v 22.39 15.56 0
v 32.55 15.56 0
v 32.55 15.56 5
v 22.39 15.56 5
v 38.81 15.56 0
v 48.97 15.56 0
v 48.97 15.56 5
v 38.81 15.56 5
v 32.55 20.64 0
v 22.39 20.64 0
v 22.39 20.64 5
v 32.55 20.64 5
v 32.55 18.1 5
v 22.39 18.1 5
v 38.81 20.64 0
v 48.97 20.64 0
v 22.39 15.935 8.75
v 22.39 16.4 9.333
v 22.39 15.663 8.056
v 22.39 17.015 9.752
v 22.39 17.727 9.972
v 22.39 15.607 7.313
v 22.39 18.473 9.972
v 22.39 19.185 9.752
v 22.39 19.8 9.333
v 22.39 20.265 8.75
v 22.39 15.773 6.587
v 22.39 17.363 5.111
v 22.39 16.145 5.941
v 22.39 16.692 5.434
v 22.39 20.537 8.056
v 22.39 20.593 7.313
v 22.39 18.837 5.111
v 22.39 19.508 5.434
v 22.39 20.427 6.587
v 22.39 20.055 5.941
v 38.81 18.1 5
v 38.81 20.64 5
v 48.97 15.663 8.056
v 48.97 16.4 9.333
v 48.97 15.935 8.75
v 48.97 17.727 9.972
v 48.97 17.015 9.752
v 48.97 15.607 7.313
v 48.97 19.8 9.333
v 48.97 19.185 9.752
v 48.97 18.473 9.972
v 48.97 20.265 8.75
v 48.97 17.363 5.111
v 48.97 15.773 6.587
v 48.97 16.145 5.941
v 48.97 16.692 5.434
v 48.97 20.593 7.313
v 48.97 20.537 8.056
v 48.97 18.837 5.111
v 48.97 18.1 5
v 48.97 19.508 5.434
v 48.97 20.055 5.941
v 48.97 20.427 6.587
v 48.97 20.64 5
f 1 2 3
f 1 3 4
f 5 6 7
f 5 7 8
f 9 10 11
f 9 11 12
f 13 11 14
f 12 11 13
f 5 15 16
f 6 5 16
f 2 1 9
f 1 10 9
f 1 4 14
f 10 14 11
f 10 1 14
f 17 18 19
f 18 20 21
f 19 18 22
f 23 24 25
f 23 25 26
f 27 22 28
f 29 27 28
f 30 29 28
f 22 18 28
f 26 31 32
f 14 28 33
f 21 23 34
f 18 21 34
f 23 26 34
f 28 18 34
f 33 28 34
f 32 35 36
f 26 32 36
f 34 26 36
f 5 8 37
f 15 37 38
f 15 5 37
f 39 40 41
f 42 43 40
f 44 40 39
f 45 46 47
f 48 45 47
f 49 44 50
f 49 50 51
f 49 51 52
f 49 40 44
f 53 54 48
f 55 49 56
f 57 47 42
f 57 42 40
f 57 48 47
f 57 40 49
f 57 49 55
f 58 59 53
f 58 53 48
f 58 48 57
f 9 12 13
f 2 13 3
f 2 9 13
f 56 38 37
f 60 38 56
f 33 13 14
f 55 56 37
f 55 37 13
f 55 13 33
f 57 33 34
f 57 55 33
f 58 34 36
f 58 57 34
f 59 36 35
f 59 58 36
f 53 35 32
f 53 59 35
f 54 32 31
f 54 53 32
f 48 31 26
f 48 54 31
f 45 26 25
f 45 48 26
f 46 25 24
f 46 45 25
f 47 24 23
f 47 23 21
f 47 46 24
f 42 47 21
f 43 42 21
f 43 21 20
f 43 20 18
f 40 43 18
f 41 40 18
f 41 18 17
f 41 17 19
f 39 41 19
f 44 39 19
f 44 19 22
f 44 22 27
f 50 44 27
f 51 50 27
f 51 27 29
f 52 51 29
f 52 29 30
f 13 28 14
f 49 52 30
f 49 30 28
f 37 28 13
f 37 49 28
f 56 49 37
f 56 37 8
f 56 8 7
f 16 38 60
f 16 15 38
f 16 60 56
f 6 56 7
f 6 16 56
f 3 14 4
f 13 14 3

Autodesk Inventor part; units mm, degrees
ref_plane "YZ Plane" through (0, 0, 0) normal (1, 0, 0) x (0, 1, 0)
ref_plane "XZ Plane" through (0, 0, 0) normal (0, 1, 0) x (-1, 0, 0)
ref_plane "XY Plane" through (0, 0, 0) normal (0, 0, 1) x (1, 0, 0)
ref_plane "Work Plane1" through (0, 0, 0) normal (0, 0, 1) x (1, 0, 0)
sketch "Sketch1" plane through (0, 0, 0) normal (0, 0, 1) x (1, 0, 0)
  circle A0 centre (23.98, 18.1) radius 0.8 projected
  circle A1 centre (47.16, 18.1) radius 0.8 projected
  circle A2 centre (40.4, 18.1) radius 0.8 projected
  circle A3 centre (30.74, 18.1) radius 0.8 projected
  line L0 (22.39, 20.64) -> (32.55, 20.64)
  line L1 (32.55, 20.64) -> (32.55, 15.56)
  line L2 (32.55, 15.56) -> (22.39, 15.56)
  line L3 (22.39, 15.56) -> (22.39, 20.64)
  circle A4 centre (27.47, 18.1025) radius 0.3 projected
  circle A5 centre (43.98, 16.8325) radius 0.3 projected
  line L4 (38.81, 20.64) -> (48.97, 20.64)
  line L5 (48.97, 20.64) -> (48.97, 15.56)
  line L6 (48.97, 15.56) -> (38.81, 15.56)
  line L7 (38.81, 15.56) -> (38.81, 20.64)
  point P0 (0, 0)
  point P1 (32.55, 18.1)
  point P2 (27.47, 20.64)
  dimension "d0" = 5.08
  dimension "d1" = 10.16
  dimension "d2" = 5.08
  dimension "d3" = 10.16
extrude "Extrusion1" add sketch "Sketch1" along normal blind 5 contours A0 | A1 | A2 | A3 | L0 L1 L2 L3 | A4 | A5 | L4 L5 L6 L7
sketch "Sketch2" plane through (48.97, 15.56, 0) normal (1, 0, 0) x (0, 0, -1)
  line L0 (0, 5.08) -> (0, 0) projected
  line L1 (0, 5.08) -> (-5, 5.08) projected
  line L2 (-5, 0) -> (-5, 5.08) projected
  line L3 (0, 0) -> (-5, 0) projected
  circle A0 centre (-7.5, 2.54) radius 2.5
  point P0 (0, -15.56)
  point P1 (-5, 2.54)
  dimension "d6" = 5
  dimension "d7" = 2.5
extrude "Extrusion2" add sketch "Sketch2" against normal up to surface (26.58 mm away) contours A0
properties part number "fuse"
